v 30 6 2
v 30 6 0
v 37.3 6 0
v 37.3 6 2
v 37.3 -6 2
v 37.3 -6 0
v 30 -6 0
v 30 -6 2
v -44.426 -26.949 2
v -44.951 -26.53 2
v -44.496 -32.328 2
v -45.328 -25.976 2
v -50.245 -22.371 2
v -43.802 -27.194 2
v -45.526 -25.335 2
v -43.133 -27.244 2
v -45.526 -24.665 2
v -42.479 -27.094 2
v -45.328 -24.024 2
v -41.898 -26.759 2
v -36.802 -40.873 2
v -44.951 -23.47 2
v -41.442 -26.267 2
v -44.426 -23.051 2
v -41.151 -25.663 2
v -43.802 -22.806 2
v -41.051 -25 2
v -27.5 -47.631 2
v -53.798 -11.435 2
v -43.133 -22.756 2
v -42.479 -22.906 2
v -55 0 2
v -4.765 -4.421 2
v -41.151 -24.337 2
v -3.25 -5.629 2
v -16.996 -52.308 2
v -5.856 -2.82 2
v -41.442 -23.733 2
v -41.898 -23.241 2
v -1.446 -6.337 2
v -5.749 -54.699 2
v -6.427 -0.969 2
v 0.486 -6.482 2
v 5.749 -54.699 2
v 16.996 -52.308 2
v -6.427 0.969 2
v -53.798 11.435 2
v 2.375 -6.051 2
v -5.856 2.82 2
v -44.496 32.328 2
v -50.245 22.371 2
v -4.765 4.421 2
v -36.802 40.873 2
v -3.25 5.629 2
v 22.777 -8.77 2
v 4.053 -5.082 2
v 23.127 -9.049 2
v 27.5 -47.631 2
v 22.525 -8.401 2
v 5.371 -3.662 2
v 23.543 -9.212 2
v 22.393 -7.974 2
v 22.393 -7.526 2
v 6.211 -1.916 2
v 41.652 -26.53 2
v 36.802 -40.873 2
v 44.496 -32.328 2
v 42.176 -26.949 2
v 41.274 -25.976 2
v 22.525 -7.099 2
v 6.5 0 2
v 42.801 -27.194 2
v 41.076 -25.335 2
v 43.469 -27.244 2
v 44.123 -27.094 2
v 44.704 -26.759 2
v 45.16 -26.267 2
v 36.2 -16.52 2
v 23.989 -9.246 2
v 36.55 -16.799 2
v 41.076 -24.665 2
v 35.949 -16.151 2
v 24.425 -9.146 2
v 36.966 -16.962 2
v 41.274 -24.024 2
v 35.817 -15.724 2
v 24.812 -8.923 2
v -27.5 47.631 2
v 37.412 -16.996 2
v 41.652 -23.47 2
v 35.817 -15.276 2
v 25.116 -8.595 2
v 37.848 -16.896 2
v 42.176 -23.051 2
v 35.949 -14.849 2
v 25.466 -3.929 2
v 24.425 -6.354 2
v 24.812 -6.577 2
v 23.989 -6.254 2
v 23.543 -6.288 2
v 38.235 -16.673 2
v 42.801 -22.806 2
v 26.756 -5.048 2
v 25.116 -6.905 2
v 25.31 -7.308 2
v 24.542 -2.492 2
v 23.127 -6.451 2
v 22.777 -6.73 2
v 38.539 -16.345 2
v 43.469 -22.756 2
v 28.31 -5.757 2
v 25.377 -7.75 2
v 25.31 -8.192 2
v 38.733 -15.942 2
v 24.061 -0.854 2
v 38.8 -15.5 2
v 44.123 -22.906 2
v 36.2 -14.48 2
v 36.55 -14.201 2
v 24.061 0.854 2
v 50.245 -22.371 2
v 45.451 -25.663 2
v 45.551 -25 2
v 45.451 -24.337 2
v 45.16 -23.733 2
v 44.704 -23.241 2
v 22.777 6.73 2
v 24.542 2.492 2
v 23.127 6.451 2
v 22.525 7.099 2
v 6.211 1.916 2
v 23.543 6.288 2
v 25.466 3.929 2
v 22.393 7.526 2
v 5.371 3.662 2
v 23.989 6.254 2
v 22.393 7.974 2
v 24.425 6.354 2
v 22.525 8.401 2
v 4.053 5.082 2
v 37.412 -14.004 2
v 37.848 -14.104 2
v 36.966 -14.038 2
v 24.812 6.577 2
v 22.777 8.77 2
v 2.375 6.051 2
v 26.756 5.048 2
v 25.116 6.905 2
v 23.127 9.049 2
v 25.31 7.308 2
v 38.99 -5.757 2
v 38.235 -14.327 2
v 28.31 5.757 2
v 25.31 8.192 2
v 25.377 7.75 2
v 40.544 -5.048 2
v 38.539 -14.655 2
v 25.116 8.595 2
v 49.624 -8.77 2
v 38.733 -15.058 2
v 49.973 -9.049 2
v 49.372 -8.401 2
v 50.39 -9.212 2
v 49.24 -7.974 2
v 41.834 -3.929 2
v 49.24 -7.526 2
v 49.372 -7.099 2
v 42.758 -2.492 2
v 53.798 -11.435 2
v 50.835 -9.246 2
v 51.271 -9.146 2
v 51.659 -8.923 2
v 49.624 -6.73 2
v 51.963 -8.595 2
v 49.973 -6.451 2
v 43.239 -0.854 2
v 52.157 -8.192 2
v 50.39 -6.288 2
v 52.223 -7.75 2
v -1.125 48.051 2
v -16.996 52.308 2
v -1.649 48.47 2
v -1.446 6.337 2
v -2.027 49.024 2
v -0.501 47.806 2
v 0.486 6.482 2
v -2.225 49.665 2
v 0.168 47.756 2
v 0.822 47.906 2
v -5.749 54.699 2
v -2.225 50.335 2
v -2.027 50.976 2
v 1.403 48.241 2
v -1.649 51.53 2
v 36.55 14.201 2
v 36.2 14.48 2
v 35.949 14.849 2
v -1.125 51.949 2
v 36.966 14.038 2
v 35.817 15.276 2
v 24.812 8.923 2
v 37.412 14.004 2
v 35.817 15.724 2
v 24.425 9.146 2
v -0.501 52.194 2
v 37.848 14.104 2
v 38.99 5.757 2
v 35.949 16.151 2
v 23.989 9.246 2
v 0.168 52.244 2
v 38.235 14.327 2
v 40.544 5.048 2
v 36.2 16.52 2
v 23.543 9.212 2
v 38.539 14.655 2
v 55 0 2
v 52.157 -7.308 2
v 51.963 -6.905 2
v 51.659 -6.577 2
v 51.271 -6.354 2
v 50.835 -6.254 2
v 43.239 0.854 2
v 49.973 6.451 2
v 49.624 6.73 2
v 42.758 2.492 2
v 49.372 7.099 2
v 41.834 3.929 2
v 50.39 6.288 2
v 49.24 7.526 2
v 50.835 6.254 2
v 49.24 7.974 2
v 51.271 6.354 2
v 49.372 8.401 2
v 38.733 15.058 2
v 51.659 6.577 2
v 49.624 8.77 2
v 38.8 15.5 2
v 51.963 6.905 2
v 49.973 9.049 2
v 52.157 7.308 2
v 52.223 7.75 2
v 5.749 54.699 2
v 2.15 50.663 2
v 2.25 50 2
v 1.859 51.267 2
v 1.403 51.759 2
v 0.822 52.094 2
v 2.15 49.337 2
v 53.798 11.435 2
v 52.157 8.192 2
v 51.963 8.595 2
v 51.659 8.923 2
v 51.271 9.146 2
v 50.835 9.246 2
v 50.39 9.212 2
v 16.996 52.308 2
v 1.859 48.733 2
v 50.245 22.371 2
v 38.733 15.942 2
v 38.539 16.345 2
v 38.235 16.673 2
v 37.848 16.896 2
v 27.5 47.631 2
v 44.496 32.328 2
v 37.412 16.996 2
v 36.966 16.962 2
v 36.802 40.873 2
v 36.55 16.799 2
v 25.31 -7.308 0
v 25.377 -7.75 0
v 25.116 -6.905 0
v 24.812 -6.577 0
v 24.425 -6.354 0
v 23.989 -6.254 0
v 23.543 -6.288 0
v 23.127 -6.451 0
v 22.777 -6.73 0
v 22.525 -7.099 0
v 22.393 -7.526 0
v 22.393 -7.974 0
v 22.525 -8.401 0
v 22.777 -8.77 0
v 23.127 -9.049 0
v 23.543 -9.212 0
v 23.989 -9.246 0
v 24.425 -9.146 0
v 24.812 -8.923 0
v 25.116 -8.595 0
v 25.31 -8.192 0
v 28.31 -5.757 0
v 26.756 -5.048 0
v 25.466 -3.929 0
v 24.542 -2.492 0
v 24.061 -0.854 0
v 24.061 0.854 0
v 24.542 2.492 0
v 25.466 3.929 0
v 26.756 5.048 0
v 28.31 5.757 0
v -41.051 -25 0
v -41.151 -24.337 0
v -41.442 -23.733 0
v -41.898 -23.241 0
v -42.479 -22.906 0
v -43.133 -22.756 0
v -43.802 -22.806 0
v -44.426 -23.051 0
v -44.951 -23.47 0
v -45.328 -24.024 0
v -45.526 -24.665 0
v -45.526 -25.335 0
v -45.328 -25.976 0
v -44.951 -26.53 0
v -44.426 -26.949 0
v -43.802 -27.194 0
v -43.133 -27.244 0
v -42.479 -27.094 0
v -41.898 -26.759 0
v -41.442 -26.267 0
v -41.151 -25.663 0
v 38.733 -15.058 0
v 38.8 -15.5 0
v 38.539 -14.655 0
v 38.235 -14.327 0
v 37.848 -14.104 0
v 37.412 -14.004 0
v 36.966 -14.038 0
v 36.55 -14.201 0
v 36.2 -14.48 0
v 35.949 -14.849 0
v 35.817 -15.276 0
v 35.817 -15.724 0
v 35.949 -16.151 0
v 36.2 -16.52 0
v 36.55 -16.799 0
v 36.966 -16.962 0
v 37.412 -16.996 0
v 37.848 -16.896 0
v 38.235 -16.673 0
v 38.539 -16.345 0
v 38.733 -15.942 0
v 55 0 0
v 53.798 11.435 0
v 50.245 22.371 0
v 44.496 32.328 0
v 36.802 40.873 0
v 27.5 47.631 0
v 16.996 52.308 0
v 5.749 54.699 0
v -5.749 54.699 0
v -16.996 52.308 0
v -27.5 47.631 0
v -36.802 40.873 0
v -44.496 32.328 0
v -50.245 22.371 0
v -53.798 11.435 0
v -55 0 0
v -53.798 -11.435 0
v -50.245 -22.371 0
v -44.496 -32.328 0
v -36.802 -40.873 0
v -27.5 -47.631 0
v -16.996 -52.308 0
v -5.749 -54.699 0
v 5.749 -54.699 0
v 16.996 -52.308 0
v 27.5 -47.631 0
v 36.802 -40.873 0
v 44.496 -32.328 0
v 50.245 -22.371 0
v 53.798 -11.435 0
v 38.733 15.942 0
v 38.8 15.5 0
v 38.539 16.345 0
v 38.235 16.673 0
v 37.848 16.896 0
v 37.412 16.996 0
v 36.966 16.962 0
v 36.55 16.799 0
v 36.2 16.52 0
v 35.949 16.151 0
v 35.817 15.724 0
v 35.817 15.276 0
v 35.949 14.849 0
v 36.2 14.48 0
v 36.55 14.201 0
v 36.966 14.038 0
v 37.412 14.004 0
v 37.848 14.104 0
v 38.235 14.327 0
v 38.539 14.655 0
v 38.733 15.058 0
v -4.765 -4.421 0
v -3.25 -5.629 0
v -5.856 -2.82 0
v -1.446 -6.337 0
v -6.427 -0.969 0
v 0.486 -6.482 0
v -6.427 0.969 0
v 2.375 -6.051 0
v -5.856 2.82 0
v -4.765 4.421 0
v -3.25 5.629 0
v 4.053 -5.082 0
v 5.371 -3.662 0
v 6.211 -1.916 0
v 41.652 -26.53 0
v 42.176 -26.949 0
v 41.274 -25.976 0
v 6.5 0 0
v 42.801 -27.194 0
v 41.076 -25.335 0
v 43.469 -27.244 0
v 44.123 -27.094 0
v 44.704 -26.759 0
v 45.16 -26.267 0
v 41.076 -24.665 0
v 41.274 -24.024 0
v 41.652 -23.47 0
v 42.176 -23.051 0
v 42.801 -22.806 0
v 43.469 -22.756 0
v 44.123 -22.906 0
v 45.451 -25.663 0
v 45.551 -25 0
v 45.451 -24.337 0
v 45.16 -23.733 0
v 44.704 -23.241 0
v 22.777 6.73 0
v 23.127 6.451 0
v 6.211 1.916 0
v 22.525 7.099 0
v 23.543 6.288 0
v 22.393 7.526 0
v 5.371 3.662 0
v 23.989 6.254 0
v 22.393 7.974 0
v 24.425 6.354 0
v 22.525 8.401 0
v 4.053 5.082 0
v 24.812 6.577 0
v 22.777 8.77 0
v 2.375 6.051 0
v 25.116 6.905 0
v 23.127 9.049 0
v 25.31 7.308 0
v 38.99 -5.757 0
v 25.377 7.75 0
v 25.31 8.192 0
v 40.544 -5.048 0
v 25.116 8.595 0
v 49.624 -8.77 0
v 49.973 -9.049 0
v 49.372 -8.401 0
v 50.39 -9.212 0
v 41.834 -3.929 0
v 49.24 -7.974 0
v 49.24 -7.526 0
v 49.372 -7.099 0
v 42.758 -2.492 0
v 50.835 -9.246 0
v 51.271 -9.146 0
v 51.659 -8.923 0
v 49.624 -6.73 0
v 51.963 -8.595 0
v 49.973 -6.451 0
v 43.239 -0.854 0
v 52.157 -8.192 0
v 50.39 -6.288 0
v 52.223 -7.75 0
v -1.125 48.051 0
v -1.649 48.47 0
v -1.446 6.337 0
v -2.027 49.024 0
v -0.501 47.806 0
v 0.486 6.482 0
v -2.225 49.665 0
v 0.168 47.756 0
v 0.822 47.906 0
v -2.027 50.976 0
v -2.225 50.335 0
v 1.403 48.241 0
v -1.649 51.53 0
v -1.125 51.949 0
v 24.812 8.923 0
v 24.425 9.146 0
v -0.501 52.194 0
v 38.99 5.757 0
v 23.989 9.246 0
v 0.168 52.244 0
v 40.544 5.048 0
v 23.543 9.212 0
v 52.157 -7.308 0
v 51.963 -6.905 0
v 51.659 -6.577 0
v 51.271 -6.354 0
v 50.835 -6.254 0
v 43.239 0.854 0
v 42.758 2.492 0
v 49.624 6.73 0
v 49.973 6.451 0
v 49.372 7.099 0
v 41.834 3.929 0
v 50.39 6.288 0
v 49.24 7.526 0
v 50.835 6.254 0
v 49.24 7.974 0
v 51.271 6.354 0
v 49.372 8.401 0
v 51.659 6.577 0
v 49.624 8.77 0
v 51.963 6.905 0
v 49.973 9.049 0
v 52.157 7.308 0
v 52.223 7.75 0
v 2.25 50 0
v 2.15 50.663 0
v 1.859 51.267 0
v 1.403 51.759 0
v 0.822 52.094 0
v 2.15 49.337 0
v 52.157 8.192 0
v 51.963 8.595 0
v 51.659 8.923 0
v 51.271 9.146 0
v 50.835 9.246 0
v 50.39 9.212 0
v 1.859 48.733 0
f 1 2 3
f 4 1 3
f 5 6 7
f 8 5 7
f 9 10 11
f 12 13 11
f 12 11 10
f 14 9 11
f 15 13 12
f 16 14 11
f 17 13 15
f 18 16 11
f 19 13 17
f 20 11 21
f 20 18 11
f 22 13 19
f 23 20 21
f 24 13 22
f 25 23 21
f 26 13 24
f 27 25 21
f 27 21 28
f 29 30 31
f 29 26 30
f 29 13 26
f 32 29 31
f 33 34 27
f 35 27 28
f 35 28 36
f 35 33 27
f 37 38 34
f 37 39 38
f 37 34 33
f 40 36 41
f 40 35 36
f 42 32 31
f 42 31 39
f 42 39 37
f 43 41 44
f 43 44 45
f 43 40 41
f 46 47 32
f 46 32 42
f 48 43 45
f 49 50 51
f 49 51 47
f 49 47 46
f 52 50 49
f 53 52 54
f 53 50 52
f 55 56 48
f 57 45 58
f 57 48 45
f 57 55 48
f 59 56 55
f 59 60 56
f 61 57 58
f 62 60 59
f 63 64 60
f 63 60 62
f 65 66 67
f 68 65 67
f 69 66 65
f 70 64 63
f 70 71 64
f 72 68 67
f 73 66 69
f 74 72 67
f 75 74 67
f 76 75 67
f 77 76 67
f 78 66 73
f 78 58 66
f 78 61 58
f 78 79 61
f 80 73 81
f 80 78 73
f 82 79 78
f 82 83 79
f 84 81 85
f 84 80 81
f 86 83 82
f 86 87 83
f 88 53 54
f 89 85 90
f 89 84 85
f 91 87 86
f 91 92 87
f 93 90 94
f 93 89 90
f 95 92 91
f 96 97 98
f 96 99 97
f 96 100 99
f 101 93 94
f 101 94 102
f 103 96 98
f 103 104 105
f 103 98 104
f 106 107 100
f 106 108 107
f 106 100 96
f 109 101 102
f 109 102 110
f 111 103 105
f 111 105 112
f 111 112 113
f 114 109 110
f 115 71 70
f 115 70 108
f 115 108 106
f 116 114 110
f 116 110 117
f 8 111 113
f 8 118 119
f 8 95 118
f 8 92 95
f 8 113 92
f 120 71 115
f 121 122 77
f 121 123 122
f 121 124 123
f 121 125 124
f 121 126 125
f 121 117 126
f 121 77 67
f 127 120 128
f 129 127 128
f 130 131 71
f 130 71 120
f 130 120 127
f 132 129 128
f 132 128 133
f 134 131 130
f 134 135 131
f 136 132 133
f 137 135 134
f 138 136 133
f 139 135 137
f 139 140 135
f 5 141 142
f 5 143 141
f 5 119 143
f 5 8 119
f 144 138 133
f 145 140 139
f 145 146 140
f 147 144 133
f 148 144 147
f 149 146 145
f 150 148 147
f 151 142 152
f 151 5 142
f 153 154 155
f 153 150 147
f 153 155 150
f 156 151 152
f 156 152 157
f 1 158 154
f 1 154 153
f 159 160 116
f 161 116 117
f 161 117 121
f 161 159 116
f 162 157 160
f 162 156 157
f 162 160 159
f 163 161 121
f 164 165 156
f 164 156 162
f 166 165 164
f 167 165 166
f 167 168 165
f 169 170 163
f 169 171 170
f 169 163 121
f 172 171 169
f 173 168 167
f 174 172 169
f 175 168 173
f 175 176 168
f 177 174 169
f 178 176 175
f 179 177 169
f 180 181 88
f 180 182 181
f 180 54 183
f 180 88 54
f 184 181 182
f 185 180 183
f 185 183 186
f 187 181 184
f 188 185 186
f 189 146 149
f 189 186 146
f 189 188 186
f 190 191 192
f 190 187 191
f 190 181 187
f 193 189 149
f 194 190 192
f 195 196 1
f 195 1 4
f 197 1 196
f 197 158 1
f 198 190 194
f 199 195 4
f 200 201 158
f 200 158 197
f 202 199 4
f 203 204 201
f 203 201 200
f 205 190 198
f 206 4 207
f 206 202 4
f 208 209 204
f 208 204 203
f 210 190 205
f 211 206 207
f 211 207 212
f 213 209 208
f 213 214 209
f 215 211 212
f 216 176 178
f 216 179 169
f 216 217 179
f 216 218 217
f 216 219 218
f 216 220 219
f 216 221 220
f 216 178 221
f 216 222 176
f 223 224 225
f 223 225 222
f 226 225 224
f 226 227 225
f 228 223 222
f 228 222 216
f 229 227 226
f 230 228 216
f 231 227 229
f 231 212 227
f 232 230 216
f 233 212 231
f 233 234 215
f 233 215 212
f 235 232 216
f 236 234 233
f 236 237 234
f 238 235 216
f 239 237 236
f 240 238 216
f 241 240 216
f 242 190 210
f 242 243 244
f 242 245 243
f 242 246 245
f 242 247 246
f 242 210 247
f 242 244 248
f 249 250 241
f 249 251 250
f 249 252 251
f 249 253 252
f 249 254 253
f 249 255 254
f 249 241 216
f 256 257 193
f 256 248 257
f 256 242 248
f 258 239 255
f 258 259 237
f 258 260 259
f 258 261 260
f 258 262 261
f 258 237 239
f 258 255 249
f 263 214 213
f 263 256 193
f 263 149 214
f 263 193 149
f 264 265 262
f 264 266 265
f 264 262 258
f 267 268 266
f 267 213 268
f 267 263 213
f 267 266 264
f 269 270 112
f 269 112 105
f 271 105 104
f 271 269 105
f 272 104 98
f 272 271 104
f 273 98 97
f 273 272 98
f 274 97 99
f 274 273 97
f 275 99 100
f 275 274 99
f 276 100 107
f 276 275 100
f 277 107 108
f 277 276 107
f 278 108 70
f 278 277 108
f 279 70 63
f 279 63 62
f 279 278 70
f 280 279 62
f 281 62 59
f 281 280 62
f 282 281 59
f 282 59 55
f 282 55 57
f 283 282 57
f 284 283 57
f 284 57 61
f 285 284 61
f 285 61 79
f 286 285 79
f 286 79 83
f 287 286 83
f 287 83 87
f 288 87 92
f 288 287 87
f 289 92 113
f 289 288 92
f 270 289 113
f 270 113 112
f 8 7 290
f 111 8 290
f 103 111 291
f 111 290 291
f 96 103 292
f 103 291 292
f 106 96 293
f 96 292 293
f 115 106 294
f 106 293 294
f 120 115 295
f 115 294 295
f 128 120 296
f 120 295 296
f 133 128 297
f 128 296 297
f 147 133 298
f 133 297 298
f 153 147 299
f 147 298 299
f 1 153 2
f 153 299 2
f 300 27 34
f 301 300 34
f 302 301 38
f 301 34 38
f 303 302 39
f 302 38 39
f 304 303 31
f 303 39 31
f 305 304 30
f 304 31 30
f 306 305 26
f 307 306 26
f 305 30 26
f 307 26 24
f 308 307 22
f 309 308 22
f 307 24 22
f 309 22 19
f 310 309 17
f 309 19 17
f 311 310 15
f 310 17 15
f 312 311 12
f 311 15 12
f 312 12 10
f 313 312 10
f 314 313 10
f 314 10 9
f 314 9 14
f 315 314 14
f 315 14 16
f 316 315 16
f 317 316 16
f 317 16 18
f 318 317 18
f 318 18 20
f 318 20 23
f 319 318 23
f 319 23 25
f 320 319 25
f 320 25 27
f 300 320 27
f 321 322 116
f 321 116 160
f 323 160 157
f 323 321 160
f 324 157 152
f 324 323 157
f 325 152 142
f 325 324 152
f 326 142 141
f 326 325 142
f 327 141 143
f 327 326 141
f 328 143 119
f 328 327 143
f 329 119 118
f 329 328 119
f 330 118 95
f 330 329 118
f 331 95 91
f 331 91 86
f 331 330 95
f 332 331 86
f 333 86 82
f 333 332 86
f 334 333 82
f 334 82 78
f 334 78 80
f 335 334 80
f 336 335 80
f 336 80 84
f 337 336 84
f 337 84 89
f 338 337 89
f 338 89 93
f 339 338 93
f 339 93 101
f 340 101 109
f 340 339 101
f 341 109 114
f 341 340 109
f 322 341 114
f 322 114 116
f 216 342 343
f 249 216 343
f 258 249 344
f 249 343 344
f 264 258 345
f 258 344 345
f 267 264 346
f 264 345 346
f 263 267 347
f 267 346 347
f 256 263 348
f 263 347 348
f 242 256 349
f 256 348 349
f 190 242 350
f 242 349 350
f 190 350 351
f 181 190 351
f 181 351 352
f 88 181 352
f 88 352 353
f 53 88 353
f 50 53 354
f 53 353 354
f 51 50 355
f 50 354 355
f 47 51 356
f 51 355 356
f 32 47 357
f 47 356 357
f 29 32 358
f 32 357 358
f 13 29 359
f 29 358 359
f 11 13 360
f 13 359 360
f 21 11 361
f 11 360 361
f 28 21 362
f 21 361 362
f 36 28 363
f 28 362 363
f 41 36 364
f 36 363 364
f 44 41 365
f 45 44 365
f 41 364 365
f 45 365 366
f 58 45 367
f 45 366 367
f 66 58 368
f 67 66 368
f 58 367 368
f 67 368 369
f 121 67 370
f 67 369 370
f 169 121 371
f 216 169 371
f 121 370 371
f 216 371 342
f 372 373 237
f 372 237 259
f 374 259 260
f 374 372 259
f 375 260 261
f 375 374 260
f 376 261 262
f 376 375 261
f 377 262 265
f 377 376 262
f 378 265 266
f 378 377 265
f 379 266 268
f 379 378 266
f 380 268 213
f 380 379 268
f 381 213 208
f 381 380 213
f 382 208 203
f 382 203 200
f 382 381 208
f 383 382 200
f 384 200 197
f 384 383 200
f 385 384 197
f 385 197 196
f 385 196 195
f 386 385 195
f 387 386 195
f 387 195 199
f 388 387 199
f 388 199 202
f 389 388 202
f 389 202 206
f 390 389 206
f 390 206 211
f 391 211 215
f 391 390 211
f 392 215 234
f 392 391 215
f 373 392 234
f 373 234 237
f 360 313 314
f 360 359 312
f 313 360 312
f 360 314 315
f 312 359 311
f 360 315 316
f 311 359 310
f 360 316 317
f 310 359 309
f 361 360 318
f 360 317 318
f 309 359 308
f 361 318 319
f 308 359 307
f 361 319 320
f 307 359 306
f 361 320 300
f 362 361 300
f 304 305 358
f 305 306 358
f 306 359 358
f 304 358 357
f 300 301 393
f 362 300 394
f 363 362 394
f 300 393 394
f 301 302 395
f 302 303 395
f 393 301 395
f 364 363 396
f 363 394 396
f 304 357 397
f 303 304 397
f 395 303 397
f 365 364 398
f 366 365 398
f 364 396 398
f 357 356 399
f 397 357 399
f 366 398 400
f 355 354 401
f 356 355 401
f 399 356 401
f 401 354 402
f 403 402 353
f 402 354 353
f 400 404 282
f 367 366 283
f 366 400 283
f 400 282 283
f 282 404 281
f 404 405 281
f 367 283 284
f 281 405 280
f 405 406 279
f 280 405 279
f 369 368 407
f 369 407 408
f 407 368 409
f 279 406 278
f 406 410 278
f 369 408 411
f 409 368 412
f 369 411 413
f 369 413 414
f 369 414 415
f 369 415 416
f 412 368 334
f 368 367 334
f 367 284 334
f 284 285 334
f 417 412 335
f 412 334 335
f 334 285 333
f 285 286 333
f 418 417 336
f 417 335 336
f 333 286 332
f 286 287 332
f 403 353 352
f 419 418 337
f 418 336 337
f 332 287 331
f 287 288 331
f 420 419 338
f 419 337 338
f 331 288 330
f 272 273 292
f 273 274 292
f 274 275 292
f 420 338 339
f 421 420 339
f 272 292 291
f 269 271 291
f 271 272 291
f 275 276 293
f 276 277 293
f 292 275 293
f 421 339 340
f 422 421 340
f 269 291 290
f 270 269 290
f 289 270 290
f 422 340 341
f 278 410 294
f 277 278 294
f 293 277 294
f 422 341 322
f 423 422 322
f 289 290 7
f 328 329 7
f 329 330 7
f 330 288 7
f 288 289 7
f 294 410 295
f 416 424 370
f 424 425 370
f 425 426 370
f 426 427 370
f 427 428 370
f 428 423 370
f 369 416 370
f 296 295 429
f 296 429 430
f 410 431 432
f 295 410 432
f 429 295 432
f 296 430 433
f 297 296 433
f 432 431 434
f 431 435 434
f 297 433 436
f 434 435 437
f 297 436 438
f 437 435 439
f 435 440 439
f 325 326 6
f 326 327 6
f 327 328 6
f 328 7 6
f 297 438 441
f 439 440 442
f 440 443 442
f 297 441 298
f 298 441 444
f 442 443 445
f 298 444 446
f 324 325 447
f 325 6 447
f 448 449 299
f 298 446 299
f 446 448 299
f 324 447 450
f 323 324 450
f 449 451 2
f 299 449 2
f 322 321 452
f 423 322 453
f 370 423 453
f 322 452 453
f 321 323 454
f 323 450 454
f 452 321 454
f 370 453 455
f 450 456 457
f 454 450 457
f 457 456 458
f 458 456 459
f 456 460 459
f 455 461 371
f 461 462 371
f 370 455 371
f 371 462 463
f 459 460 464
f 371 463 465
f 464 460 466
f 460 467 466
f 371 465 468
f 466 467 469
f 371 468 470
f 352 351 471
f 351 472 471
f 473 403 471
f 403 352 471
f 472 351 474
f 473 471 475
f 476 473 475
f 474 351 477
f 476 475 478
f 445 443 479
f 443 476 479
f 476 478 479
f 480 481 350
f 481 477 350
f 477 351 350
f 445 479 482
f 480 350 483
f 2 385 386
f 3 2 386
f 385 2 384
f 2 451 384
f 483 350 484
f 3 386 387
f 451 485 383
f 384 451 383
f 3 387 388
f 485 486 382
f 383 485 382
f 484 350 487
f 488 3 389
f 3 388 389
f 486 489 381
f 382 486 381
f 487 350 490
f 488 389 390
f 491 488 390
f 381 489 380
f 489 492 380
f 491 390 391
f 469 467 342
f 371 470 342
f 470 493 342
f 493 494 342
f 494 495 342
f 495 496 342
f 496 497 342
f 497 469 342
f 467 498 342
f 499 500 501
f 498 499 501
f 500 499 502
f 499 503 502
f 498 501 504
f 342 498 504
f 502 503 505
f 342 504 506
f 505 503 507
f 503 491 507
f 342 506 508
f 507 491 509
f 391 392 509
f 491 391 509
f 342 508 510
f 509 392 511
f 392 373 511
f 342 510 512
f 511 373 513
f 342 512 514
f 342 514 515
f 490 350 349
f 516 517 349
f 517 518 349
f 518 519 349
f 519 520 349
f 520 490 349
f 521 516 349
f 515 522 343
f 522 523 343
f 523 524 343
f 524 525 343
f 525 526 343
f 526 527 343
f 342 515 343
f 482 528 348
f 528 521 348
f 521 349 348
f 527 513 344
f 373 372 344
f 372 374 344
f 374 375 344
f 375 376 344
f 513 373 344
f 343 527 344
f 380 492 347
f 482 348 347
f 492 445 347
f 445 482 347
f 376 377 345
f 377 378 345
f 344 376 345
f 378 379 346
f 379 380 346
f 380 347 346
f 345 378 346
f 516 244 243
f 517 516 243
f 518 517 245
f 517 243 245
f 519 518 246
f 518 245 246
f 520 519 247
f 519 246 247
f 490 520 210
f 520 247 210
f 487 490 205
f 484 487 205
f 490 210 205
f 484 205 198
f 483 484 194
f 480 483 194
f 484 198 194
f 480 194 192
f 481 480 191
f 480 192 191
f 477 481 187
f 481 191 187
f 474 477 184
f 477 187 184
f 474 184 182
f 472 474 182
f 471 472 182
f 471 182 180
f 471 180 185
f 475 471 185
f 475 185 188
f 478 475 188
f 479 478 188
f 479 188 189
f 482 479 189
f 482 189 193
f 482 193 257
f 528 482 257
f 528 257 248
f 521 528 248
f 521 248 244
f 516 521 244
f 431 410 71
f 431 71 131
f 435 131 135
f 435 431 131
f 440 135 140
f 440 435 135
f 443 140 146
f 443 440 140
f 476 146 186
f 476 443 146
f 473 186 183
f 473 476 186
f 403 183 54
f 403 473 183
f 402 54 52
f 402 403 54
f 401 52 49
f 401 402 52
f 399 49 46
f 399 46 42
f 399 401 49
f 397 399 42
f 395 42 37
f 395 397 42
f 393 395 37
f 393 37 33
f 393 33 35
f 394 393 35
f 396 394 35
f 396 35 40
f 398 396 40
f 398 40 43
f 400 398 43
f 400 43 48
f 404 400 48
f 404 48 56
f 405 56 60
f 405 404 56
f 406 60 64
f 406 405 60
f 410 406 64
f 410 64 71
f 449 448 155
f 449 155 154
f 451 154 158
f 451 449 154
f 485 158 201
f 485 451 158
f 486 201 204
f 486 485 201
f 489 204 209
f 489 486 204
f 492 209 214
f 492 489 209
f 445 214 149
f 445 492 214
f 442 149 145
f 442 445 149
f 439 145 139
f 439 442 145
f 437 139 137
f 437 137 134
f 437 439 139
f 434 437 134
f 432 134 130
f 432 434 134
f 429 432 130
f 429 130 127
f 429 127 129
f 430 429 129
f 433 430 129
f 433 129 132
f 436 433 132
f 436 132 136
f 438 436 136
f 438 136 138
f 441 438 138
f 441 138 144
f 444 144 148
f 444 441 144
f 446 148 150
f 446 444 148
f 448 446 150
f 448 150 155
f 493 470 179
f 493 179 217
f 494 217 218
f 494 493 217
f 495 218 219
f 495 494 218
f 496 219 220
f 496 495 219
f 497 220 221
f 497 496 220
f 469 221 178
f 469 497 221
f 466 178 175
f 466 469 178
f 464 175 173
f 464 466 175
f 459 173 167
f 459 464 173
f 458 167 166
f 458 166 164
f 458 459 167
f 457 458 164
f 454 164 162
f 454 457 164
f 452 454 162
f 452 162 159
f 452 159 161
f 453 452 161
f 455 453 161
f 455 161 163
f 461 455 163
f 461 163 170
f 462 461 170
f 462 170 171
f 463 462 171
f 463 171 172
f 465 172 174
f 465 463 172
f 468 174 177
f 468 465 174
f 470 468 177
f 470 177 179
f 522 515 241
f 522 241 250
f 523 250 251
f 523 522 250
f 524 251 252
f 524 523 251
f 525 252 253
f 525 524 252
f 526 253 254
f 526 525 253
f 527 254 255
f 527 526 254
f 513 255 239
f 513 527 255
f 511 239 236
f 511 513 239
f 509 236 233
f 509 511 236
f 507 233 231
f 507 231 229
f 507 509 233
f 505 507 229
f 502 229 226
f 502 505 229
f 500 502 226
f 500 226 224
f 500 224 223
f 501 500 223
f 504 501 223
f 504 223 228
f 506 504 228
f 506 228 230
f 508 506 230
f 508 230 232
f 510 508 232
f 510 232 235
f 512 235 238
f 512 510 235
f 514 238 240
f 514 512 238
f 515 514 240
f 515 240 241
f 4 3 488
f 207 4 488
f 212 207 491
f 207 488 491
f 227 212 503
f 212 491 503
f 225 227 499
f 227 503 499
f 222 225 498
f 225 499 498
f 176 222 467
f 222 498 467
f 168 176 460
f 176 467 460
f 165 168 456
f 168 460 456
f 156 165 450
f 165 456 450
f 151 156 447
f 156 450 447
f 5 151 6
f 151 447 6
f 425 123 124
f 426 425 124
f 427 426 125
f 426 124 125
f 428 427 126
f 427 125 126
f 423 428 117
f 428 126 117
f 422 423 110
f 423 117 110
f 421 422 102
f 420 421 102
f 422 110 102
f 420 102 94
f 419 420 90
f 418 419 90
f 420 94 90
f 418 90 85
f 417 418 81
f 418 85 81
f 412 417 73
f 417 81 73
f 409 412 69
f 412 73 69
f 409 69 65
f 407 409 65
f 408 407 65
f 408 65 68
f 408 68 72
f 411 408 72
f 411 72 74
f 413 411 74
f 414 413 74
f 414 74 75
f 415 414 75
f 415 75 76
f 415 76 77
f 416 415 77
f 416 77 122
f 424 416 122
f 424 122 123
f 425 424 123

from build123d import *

# Parameters (mm, degrees)
SKETCH_1_R          = 55
SKETCH_1_R_2        = 1.5
SKETCH_1_R_3        = 6.5
EXTRUDE_1_DEPTH     = 2
SKETCH_3_R          = 2.25
CUT_EXTRUDE_1_DEPTH = 78.807454656


with BuildPart() as part:
    # 草图1 → 凸台-拉伸1 (new body)
    with BuildSketch(Plane.XY):
        Circle(SKETCH_1_R)
        with Locations((37.3, 15.5)):
            Circle(SKETCH_1_R_2, mode=Mode.SUBTRACT)
        with Locations((50.723393759, 7.75)):
            Circle(SKETCH_1_R_2, mode=Mode.SUBTRACT)
        with Locations((50.723393759, -7.75)):
            Circle(SKETCH_1_R_2, mode=Mode.SUBTRACT)
        with Locations((37.3, -15.5)):
            Circle(SKETCH_1_R_2, mode=Mode.SUBTRACT)
        with Locations((23.876606241, -7.75)):
            Circle(SKETCH_1_R_2, mode=Mode.SUBTRACT)
        with Locations((23.876606241, 7.75)):
            Circle(SKETCH_1_R_2, mode=Mode.SUBTRACT)
        Circle(SKETCH_1_R_3, mode=Mode.SUBTRACT)
        with BuildLine():
            Line((37.3, -6), (30, -6))
            ThreePointArc((30, -6), (24, 0), (30, 6))
            Line((30, 6), (37.3, 6))
            ThreePointArc((37.3, 6), (43.3, 0), (37.3, -6))
        make_face(mode=Mode.SUBTRACT)
    extrude(amount=EXTRUDE_1_DEPTH)

    # 草图3 → 切除-拉伸1 (cut, through all)
    with BuildSketch(Plane.XY.offset(2)):
        with Locations((0, 50)):
            Circle(SKETCH_3_R)
        with Locations((43.301270189, -25)):
            Circle(SKETCH_3_R)
        with Locations((-43.301270189, -25)):
            Circle(SKETCH_3_R)
    extrude(amount=-CUT_EXTRUDE_1_DEPTH, mode=Mode.SUBTRACT)


solid = part.part
